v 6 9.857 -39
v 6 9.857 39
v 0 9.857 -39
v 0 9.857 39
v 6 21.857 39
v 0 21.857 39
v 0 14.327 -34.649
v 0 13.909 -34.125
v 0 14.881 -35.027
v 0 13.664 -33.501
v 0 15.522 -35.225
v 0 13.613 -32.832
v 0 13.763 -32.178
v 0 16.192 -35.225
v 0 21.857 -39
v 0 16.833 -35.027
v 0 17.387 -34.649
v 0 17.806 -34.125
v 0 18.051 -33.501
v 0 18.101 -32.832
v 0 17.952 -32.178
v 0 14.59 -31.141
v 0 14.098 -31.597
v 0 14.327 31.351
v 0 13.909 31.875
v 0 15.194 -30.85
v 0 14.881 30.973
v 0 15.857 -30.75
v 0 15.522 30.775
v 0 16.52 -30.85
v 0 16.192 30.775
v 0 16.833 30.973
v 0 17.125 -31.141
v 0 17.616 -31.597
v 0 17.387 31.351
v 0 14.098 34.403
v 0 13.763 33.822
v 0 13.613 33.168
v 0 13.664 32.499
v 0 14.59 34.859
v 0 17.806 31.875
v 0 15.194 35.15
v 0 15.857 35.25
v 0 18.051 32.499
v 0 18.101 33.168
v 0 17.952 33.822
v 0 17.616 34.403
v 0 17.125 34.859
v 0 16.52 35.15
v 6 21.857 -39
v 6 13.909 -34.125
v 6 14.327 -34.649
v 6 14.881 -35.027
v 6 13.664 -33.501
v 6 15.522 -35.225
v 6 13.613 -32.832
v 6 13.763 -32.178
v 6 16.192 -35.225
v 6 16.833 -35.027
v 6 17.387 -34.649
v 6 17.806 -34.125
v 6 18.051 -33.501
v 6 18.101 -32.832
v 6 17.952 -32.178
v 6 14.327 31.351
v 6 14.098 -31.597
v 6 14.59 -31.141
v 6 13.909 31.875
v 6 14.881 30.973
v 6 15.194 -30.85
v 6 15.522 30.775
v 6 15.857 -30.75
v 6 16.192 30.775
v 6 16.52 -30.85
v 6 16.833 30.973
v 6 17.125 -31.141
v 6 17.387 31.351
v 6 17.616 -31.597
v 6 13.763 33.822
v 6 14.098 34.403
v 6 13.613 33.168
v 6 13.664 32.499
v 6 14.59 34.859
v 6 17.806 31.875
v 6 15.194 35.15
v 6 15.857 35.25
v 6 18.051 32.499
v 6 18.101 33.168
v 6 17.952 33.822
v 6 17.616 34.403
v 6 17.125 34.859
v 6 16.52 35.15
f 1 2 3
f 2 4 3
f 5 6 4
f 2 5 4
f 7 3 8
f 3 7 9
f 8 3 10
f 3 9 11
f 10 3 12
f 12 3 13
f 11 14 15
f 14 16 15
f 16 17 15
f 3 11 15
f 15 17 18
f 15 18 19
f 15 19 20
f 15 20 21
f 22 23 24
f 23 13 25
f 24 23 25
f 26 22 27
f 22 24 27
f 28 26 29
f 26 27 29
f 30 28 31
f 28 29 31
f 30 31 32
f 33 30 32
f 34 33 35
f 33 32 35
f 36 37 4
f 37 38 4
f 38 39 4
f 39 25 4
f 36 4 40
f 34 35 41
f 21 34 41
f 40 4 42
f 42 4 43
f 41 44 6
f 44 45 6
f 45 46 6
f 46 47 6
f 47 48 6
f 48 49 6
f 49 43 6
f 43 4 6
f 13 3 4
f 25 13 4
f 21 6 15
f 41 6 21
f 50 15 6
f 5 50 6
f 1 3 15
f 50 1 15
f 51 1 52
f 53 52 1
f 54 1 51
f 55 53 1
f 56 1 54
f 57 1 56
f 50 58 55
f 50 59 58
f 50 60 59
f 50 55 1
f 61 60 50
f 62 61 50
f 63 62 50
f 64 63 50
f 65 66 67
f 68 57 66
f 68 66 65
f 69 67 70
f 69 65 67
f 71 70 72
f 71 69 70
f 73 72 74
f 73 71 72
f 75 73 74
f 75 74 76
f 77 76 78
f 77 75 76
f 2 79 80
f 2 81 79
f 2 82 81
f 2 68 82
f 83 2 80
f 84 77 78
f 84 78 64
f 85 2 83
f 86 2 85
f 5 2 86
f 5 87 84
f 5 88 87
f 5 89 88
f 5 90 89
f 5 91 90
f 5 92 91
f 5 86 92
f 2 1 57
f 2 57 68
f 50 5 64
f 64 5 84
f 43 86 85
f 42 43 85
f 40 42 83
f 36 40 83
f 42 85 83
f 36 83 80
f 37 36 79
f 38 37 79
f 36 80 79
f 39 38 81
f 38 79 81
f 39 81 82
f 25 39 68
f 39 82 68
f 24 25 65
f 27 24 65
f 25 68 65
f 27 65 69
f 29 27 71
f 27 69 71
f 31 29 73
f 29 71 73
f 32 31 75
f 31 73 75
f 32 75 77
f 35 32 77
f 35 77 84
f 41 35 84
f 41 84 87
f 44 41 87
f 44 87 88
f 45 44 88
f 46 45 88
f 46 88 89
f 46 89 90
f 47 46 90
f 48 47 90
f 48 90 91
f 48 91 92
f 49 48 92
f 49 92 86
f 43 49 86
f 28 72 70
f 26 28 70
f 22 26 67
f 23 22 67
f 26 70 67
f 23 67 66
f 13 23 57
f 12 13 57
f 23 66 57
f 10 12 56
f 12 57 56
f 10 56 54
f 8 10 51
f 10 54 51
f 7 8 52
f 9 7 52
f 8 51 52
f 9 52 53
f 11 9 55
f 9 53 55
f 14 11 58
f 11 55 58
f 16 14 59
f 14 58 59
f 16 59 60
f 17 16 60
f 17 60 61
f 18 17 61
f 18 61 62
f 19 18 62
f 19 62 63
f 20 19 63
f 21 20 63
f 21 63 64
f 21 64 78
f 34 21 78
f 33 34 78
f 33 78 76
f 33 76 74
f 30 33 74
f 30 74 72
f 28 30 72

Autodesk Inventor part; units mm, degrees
ref_plane "YZ Plane" through (0, 0, 0) normal (1, 0, 0) x (0, 1, 0)
ref_plane "XZ Plane" through (0, 0, 0) normal (0, 1, 0) x (-1, 0, 0)
ref_plane "XY Plane" through (0, 0, 0) normal (0, 0, 1) x (1, 0, 0)
sketch "Sketch1" plane through (0, 0, 0) normal (1, 0, 0) x (0, 1, 0)
  line L0 (21.8571, 39) -> (9.8571, 39)
  line L1 (9.8571, 39) -> (9.8571, -39)
  line L2 (9.8571, -39) -> (21.8571, -39)
  line L3 (21.8571, -39) -> (21.8571, 39)
  line L4 (9.8571, 0) -> (21.8571, 0)
  point P0 (0, 0)
  point P1 (15.8571, 33)
  point P2 (15.8571, -33)
  dimension "d0" = 78
  dimension "d1" = 12
  dimension "d2" = 6
  dimension "d3" = 6
  dimension "d4" = 39
extrude "Extrusion1" add sketch "Sketch1" along normal blind 6
hole "Hole1" at (0, 15.8571, 33) at (0, 15.8571, -33) direction (1, 0, 0) diameter 4.5 end through all clearance for "Flat Head Machine Screw" size "M4" standard "Ansi Metric M Profile"
properties part number "Weight Baby"
